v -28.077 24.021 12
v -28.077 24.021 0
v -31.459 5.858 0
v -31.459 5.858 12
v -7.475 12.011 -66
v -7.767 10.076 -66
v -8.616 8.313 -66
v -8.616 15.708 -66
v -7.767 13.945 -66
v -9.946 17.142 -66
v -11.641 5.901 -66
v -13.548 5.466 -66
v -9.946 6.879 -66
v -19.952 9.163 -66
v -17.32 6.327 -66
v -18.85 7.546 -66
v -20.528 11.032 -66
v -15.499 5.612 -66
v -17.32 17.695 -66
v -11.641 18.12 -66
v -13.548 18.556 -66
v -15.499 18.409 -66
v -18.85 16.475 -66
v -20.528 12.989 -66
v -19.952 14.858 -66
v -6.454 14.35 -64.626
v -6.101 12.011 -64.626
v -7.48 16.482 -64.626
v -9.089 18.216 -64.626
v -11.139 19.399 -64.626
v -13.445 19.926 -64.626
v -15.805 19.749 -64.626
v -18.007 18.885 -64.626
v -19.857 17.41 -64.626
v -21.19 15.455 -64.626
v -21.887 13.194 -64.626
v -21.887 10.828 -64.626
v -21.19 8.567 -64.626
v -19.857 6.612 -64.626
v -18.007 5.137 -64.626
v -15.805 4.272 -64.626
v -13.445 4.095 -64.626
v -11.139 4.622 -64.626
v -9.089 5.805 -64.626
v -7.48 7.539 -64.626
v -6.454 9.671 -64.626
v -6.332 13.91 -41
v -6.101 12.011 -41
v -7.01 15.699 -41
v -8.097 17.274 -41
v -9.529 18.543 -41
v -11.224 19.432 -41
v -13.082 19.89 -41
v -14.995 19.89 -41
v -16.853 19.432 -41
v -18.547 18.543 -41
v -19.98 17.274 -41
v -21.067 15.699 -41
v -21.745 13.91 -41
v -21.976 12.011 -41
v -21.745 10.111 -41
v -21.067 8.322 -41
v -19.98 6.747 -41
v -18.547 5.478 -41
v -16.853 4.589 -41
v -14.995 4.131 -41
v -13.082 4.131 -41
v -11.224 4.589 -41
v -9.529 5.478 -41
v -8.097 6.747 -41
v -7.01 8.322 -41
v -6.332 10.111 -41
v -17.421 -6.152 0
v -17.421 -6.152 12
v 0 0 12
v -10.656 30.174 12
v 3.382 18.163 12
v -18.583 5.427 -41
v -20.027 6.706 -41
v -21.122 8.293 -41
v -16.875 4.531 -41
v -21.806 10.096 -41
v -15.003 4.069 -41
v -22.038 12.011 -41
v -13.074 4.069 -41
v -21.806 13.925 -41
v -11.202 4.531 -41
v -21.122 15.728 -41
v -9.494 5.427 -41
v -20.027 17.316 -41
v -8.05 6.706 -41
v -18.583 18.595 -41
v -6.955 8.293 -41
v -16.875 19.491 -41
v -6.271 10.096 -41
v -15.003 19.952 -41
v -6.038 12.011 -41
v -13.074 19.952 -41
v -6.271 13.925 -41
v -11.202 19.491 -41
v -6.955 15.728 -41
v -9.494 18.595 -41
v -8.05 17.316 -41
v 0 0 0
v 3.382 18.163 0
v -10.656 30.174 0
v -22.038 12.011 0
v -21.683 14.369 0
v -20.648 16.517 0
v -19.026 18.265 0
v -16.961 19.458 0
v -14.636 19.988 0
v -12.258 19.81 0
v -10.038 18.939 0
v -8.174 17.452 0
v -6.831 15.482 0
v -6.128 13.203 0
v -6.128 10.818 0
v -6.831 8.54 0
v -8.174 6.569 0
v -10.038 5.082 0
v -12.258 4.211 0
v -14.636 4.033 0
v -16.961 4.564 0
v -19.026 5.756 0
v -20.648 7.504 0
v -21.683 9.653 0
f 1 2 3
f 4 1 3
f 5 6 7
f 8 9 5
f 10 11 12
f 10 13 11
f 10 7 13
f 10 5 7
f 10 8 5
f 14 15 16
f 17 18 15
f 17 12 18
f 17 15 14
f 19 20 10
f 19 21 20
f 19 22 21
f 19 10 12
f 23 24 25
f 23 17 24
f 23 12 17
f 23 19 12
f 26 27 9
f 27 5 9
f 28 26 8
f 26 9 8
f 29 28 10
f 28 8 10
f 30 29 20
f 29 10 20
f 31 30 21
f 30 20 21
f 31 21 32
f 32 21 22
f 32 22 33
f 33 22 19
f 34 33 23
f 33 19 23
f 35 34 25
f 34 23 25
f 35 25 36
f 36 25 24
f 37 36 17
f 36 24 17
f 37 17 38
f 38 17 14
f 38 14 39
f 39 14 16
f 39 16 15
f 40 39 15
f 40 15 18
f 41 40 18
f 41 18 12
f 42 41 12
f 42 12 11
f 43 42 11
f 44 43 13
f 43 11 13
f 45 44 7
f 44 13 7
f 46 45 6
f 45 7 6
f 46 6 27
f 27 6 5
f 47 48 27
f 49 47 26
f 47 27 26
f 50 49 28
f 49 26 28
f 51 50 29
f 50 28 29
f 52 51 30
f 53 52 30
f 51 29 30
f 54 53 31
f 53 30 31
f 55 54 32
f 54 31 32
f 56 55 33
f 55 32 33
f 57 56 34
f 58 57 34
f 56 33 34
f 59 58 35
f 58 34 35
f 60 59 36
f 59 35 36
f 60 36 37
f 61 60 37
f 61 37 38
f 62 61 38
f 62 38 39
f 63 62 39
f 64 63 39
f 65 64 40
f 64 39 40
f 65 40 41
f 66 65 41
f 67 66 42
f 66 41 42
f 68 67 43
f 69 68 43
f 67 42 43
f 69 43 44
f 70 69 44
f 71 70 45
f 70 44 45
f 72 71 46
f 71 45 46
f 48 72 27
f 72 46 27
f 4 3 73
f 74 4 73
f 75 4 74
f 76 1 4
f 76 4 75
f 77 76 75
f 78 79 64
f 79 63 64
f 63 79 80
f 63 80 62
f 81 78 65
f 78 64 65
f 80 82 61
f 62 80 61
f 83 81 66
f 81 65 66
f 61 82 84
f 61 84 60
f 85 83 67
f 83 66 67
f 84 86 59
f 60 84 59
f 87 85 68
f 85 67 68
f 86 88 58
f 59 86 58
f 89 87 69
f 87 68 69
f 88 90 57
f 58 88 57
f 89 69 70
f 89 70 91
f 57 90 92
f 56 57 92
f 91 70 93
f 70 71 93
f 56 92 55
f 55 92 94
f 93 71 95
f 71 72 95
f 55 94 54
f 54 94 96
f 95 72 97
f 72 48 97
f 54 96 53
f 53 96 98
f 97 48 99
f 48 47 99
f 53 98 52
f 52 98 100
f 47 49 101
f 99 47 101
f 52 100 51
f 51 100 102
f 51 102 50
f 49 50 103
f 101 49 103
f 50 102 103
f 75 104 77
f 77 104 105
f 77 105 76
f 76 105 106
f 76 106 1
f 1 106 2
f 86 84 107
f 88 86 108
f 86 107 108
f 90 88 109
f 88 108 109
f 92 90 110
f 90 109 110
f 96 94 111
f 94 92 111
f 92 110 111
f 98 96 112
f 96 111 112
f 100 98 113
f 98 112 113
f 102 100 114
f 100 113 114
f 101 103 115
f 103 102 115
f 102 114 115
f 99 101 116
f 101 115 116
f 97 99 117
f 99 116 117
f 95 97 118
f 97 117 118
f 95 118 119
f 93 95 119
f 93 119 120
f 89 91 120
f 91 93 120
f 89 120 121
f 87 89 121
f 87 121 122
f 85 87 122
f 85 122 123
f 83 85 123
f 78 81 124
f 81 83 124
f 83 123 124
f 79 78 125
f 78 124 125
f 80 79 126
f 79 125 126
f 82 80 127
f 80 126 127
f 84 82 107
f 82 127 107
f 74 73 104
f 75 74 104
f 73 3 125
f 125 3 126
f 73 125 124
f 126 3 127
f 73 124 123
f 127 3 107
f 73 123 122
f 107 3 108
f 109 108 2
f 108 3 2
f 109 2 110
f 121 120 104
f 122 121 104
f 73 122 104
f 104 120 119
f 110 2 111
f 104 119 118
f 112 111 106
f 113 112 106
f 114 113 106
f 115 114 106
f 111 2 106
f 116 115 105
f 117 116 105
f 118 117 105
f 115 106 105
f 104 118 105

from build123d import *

# Parameters (mm, degrees)
BOSS_EXTRUDE1_DEPTH = 12
SKETCH4_R           = 8
BOSS_EXTRUDE3_DEPTH = 66


# Read off the part's stored shape, not the designer's step: 5/8-11 Machine Threads Stud2
with BuildPart() as part:
    # Sketch1 → Boss-Extrude1 (new body)
    with BuildSketch(Plane.XY):
        Polygon((0, 0), (3.38231859, 18.162963808), (-10.656110181, 30.173619534), (-28.076857542, 24.021311453), (-31.459176132, 5.858347645), (-17.420747361, -6.152308082), align=None)
    extrude(amount=BOSS_EXTRUDE1_DEPTH)

    # Sketch4 → Boss-Extrude3 (add)
    with BuildSketch(Plane(origin=(0, 0, 0), x_dir=(-1, 0, 0), z_dir=(0, 0, -1))):
        with Locations((14.038428771, 12.010655726)):
            Circle(SKETCH4_R)
    extrude(amount=BOSS_EXTRUDE3_DEPTH)

    # 5/8-11 Machine Threads Stud2 outline → 5/8-11 Machine Threads Stud2 (revolve, cut)
    with BuildSketch(Plane(origin=(-14.038428771, 12.010655726, 0), x_dir=(1, 0, 0), z_dir=(0, -1, 0))):
        Polygon((6.56336, -66), (8, -66), (8, -41), (7.9375, -41), (7.9375, -64.62586), align=None)
    revolve(axis=Axis((-14.038428771, 12.010655726, 0), (0, 0, 1)), mode=Mode.SUBTRACT)


solid = part.part
